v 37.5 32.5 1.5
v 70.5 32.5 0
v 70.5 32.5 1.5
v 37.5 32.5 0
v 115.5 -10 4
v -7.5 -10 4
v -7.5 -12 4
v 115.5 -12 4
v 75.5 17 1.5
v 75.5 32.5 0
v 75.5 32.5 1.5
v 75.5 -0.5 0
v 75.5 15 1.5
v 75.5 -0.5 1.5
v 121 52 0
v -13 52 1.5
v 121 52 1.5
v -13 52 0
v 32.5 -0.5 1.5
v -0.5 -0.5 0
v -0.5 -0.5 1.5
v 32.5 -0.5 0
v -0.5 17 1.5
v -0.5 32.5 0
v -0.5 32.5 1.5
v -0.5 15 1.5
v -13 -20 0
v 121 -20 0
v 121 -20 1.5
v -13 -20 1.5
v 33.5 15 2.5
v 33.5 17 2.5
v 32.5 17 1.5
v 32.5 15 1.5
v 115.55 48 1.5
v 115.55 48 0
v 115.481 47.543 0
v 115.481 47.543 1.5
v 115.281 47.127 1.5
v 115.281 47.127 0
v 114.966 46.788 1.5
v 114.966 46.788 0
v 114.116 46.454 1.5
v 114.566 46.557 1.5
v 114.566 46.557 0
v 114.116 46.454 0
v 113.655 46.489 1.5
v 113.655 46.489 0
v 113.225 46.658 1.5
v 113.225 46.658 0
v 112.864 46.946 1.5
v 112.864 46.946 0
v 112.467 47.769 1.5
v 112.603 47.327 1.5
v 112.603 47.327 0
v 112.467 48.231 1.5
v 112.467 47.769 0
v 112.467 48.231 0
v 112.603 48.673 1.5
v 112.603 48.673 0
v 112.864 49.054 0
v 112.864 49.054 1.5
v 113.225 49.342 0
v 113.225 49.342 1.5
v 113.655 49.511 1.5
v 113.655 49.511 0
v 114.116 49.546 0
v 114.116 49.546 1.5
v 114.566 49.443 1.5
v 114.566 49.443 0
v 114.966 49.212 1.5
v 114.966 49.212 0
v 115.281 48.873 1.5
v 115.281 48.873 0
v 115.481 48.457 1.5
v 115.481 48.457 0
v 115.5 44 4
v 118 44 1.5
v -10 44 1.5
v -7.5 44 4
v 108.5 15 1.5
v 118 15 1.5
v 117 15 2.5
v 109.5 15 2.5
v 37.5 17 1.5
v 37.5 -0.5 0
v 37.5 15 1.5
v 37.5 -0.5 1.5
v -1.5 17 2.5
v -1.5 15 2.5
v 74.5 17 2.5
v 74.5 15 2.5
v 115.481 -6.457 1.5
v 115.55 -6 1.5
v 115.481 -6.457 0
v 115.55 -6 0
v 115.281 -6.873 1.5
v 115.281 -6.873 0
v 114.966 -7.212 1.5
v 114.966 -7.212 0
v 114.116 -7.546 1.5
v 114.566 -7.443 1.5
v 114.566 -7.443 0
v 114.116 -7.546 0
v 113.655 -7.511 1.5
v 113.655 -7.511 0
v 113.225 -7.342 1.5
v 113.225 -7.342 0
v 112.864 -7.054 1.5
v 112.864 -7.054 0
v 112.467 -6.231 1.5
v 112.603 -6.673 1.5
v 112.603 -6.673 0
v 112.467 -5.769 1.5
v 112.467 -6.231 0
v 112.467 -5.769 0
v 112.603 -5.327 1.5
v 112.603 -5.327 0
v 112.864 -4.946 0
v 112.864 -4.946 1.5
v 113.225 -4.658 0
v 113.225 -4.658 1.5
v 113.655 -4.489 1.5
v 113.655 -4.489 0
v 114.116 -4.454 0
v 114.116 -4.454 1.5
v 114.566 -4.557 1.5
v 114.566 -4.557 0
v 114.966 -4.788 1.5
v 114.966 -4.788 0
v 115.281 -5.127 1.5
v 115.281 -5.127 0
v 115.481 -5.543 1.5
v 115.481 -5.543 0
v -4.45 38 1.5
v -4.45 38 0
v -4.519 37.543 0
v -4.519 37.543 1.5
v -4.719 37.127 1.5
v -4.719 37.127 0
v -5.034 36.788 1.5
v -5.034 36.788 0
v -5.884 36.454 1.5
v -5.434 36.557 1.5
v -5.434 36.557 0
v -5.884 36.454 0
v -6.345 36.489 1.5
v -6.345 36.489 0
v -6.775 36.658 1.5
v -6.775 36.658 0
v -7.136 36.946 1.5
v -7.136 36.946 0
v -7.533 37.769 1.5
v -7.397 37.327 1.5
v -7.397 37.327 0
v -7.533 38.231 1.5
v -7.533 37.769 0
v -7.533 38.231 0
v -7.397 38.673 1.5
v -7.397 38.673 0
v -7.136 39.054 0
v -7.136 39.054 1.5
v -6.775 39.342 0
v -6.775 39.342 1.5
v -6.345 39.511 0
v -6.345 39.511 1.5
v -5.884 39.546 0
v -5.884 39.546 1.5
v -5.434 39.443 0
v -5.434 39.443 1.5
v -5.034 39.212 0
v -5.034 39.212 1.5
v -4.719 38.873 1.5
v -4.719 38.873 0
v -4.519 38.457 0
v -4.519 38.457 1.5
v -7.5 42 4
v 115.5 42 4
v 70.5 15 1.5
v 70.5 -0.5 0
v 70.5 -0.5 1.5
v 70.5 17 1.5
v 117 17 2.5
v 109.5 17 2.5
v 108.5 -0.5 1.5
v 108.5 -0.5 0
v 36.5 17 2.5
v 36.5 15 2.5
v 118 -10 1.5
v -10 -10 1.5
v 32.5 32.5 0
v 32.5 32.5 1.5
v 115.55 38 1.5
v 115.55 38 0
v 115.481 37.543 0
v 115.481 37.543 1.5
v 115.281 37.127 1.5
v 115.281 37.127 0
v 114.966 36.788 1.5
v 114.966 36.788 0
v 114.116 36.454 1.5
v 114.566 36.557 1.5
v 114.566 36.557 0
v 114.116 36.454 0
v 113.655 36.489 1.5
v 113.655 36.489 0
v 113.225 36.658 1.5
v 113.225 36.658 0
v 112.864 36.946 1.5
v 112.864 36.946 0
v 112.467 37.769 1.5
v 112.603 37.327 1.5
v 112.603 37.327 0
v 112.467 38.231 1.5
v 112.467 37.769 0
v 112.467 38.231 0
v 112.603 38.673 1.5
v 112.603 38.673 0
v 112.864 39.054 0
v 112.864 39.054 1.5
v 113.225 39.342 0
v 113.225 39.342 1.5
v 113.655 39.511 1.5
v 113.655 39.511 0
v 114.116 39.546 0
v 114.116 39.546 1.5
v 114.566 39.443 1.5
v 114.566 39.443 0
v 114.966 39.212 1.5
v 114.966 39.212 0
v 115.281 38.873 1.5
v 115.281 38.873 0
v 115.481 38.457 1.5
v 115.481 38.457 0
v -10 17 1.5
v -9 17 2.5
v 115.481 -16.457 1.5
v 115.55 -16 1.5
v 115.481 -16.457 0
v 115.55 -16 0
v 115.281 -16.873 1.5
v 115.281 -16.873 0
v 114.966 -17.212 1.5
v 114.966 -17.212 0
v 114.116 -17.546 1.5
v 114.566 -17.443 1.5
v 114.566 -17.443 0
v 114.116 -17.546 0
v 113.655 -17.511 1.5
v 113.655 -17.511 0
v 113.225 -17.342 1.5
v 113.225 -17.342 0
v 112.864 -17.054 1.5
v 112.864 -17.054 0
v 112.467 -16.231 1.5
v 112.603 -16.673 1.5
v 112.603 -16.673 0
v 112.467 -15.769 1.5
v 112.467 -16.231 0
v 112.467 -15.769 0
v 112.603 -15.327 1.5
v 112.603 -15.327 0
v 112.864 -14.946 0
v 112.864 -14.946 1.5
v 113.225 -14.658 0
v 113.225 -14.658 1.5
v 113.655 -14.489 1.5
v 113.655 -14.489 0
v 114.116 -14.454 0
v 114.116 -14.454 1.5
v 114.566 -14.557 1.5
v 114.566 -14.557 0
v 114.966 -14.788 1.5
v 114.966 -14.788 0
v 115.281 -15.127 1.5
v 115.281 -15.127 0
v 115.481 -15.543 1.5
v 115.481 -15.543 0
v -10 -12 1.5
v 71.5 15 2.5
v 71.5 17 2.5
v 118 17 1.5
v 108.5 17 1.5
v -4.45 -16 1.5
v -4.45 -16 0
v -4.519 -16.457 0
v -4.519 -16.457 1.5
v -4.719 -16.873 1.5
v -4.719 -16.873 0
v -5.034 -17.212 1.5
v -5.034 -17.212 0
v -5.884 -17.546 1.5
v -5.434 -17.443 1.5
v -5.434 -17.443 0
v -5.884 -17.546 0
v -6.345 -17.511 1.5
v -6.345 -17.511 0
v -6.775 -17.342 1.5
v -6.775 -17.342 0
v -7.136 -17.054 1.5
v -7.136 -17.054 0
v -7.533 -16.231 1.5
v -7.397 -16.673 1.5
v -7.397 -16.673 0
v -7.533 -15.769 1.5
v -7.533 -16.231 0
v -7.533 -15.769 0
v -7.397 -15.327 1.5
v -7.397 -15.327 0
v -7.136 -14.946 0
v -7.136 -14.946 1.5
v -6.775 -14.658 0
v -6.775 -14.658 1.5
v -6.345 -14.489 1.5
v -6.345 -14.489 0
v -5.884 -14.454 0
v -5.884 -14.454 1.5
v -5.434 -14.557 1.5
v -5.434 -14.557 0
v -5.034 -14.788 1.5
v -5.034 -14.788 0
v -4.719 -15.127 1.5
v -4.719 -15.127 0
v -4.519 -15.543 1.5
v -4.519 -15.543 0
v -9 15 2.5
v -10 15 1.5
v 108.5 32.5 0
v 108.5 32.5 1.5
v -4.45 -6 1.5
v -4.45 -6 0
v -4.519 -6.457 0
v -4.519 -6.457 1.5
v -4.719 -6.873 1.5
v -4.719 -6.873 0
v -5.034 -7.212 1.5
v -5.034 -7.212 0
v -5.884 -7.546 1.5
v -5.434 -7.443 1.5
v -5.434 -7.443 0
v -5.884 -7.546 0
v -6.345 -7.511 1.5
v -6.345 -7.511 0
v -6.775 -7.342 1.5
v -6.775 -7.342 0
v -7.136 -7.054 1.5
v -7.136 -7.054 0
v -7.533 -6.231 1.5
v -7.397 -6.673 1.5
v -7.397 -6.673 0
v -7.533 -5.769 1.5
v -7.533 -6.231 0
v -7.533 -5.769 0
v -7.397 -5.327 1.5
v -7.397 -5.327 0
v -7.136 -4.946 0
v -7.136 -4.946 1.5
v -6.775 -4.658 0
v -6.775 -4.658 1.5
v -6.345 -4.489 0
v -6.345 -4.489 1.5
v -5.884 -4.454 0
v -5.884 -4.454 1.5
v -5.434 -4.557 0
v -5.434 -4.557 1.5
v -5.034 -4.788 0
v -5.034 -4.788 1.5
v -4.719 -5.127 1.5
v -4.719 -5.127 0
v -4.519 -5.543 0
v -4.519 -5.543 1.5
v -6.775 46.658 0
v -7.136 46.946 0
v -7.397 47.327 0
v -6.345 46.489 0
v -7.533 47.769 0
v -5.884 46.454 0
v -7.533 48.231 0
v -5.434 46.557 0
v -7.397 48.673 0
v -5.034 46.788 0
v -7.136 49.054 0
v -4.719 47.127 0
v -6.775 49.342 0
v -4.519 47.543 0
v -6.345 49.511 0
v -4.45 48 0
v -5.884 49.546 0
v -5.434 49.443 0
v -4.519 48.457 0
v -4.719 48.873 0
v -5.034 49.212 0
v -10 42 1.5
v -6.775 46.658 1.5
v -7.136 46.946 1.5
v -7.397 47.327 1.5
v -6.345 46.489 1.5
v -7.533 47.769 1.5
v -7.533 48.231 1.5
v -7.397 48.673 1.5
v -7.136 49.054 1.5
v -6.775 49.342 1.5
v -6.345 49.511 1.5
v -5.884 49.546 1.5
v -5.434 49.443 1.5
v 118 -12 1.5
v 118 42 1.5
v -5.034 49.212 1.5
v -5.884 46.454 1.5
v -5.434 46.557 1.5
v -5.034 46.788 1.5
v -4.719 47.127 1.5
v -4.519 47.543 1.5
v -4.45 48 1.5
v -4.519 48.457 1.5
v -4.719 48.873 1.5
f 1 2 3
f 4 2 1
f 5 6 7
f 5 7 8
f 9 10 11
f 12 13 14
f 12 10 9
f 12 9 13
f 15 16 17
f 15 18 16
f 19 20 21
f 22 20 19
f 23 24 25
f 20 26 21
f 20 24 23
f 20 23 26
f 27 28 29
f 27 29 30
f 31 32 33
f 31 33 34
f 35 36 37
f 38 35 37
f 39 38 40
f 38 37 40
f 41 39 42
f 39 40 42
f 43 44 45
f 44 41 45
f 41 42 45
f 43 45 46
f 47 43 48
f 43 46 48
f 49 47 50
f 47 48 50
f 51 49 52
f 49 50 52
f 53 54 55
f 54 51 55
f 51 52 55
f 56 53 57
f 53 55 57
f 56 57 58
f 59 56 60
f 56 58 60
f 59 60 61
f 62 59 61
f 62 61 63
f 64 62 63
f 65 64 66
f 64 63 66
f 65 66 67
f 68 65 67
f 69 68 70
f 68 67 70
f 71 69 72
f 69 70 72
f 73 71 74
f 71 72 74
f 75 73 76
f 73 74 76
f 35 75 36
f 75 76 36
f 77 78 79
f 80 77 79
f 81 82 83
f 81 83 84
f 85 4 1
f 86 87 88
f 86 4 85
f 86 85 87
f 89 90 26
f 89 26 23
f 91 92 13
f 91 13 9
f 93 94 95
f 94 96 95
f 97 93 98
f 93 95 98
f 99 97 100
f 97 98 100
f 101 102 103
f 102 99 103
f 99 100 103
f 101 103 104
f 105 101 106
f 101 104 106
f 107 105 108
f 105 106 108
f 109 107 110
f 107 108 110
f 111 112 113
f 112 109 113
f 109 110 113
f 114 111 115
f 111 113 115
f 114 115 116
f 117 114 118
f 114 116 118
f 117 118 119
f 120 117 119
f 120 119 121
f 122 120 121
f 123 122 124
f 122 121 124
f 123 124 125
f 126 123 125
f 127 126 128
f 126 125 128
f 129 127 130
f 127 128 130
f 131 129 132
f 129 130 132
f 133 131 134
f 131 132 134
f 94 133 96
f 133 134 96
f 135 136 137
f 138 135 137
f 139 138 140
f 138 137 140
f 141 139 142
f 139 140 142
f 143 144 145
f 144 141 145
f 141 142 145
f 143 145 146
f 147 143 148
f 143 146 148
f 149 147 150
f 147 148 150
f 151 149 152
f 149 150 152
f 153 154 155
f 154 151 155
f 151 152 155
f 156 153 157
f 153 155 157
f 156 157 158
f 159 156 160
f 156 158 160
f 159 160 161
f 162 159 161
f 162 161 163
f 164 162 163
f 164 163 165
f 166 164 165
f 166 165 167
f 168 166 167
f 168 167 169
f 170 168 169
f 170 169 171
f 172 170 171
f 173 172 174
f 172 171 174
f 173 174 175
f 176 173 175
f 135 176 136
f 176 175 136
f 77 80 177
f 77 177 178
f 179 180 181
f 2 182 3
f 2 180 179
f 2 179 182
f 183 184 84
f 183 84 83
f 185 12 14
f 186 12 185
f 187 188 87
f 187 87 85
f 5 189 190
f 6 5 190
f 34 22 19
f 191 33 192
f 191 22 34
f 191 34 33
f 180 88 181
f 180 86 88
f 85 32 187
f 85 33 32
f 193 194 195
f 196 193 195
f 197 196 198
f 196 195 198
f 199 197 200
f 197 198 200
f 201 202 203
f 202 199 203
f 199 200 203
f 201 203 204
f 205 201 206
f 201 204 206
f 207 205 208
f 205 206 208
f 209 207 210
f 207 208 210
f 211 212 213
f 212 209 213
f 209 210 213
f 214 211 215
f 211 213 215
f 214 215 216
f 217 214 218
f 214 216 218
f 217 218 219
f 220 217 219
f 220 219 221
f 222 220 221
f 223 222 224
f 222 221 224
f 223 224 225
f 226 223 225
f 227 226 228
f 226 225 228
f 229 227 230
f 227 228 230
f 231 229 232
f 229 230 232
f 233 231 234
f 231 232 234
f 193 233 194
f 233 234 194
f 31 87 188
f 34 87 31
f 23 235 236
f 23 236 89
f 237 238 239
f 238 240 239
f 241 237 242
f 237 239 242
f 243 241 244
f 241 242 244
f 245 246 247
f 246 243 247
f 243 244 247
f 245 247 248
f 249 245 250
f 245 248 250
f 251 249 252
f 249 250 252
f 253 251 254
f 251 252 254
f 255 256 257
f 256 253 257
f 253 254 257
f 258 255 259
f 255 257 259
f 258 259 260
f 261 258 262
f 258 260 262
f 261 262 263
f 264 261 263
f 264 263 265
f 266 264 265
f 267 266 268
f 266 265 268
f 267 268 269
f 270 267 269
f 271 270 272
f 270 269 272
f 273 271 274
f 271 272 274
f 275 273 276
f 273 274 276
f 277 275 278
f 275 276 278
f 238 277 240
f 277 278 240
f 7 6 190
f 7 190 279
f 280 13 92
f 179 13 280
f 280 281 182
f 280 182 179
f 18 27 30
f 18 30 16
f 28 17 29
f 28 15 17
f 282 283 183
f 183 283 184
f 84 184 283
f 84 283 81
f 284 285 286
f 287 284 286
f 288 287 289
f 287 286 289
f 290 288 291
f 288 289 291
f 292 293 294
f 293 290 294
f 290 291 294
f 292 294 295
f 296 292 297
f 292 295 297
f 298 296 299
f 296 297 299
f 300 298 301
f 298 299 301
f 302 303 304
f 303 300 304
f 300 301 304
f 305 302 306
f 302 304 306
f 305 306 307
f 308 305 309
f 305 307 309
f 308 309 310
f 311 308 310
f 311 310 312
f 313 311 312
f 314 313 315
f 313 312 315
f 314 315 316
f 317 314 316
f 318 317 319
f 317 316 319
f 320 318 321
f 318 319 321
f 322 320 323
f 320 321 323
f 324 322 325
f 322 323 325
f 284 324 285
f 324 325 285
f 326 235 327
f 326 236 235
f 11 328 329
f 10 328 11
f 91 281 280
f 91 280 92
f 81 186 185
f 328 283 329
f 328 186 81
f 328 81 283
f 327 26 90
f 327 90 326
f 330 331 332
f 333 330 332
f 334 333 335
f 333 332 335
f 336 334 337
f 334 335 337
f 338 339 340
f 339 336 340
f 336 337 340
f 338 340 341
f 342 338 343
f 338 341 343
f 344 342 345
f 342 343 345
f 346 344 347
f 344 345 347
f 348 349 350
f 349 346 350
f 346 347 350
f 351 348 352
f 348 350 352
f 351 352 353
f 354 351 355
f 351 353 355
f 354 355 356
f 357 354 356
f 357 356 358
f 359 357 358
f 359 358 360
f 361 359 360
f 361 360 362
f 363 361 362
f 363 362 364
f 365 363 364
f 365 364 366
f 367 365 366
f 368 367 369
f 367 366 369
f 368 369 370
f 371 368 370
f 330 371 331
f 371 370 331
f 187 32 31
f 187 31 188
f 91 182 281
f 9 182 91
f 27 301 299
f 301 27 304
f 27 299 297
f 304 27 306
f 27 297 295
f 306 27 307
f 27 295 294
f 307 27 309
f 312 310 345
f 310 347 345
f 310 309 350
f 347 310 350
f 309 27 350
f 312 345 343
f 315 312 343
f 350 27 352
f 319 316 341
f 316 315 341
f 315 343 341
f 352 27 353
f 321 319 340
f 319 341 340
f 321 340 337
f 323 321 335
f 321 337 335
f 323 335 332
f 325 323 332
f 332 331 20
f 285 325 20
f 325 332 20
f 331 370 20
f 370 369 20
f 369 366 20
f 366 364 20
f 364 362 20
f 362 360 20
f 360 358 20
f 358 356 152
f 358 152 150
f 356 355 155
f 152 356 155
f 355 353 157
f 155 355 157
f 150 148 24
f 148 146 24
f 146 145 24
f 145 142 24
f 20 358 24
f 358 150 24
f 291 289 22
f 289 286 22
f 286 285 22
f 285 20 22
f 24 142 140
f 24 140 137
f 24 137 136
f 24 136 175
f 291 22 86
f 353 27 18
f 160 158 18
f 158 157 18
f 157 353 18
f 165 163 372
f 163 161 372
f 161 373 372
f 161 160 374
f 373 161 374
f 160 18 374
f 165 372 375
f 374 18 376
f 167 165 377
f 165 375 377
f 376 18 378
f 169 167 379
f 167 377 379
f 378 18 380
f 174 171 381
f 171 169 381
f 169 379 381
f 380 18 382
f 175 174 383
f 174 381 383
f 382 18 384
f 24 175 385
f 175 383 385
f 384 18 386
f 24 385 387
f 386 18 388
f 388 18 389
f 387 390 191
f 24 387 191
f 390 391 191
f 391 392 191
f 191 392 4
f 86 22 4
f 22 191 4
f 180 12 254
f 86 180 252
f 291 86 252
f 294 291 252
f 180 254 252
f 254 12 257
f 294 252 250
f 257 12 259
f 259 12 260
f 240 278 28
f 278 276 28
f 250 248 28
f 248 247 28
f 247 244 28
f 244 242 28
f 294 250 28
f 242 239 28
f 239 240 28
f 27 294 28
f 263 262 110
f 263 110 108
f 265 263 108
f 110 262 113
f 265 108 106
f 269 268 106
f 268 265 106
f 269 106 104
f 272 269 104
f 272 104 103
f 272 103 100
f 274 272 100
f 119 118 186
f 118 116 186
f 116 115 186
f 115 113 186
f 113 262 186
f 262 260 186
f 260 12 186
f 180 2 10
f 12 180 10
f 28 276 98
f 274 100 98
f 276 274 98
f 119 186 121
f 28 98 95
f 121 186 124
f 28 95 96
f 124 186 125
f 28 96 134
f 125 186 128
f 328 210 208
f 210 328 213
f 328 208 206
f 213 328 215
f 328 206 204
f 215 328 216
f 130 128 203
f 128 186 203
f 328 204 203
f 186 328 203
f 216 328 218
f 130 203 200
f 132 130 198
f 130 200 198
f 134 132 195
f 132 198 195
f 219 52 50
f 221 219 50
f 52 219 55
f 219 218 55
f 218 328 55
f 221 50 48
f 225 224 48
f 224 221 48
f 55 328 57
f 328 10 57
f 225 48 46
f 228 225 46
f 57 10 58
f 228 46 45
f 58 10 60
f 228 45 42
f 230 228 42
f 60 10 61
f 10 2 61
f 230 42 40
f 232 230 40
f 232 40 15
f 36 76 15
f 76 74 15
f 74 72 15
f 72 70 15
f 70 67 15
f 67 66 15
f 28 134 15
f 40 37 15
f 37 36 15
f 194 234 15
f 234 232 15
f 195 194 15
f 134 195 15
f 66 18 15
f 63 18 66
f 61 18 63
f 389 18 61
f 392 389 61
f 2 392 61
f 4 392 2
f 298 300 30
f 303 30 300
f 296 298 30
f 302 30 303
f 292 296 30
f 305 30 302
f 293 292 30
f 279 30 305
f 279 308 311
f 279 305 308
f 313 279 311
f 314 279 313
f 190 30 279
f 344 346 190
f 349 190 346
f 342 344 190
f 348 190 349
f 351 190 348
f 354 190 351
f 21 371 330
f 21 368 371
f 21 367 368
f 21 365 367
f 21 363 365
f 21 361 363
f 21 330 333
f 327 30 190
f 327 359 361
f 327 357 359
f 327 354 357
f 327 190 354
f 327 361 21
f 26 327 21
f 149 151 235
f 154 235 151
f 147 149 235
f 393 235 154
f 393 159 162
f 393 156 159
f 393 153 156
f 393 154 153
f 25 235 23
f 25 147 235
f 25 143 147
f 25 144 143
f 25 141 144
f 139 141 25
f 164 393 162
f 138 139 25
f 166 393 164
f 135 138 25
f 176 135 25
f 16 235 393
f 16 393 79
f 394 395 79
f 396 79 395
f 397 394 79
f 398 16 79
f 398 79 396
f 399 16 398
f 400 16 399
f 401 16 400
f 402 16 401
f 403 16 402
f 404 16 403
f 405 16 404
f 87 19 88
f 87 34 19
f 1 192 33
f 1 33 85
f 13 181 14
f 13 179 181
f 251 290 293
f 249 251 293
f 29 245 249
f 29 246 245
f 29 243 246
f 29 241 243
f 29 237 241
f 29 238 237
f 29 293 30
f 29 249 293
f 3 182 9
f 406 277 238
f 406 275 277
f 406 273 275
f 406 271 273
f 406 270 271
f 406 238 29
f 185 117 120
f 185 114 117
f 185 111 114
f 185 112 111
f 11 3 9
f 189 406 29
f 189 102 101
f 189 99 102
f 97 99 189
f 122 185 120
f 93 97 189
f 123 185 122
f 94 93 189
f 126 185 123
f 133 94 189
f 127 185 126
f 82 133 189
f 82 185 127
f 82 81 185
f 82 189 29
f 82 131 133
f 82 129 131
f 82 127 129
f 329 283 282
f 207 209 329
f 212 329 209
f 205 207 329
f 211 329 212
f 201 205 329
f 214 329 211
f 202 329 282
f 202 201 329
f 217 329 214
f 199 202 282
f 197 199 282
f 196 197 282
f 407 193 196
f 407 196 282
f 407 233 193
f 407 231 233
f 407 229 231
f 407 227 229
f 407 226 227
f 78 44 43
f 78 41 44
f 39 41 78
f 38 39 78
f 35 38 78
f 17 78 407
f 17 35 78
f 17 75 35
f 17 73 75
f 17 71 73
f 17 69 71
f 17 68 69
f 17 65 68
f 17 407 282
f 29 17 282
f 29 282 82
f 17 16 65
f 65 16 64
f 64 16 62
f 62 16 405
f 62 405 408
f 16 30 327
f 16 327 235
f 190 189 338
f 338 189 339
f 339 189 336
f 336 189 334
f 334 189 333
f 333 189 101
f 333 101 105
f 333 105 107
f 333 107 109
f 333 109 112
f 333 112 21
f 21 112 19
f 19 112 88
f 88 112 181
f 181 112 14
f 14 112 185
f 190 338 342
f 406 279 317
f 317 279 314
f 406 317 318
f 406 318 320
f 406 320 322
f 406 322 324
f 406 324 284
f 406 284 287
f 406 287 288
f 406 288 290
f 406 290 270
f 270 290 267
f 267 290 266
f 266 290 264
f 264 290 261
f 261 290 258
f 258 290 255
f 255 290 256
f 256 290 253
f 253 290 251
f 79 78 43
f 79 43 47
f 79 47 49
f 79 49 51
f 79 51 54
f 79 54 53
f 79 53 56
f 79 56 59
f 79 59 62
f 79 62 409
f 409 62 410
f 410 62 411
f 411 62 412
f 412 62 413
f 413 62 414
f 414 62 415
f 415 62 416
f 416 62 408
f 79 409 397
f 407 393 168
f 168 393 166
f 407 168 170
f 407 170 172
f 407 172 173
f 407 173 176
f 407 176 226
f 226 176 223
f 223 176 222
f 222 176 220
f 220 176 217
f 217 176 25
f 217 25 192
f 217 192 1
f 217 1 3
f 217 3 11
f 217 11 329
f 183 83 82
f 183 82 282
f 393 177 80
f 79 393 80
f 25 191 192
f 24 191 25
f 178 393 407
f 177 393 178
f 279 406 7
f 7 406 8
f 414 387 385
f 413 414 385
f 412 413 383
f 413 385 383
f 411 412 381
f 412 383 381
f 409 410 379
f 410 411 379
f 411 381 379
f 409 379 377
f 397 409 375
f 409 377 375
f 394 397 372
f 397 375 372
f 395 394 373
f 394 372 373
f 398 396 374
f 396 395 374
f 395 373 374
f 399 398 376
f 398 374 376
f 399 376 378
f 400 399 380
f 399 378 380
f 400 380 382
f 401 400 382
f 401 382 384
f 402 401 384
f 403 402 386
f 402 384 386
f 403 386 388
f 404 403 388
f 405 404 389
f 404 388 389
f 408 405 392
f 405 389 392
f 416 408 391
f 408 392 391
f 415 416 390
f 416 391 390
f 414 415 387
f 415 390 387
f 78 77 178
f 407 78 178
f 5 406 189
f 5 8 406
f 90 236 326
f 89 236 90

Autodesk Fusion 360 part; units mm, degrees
sketch "Sketch3" plane through (0, 0, 0) normal (0, 0, 1) x (1, 0, 0)
  line L0 (0, 0) -> (32, 0)
  line L1 (32, 0) -> (32, 32)
  line L2 (32, 32) -> (0, 32)
  line L3 (0, 32) -> (0, 0)
  line L4 (-0.5, 32.5) -> (-0.5, -0.5)
  line L5 (-0.5, -0.5) -> (32.5, -0.5)
  line L6 (32.5, -0.5) -> (32.5, 32.5)
  line L7 (32.5, 32.5) -> (-0.5, 32.5)
  line L8 (70, 32) -> (38, 32)
  line L9 (38, 32) -> (38, 0)
  line L10 (37.5, -0.5) -> (70.5, -0.5)
  line L11 (70.5, 32.5) -> (37.5, 32.5)
  line L12 (70, 0) -> (70, 32)
  line L13 (70.5, -0.5) -> (70.5, 32.5)
  line L14 (38, 0) -> (70, 0)
  line L15 (37.5, 32.5) -> (37.5, -0.5)
  line L16 (108, 32) -> (76, 32)
  line L17 (76, 32) -> (76, 0)
  line L18 (75.5, -0.5) -> (108.5, -0.5)
  line L19 (108.5, 32.5) -> (75.5, 32.5)
  line L20 (108, 0) -> (108, 32)
  line L21 (108.5, -0.5) -> (108.5, 32.5)
  line L22 (76, 0) -> (108, 0)
  line L23 (75.5, 32.5) -> (75.5, -0.5)
  line L24 (38, 32) -> (70, 0)
  line L25 (70, 32) -> (38, 0)
  line L26 (118, -10) -> (-10, -10)
  line L27 (-10, -10) -> (-10, 42)
  line L28 (-10, 42) -> (118, 42)
  line L29 (118, 42) -> (118, -10)
  line L30 (118, -10) -> (-10, 42) construction
  line L31 (-10, -10) -> (118, 42) construction
  circle A0 centre (3, 26) radius 2.05
  circle A1 centre (3, 26) radius 3.55
  circle A2 centre (29, 26) radius 3.55
  circle A3 centre (29, 26) radius 2.05
  circle A4 centre (29, 6) radius 2.05
  circle A5 centre (29, 6) radius 3.55
  circle A6 centre (3, 6) radius 2.05
  circle A7 centre (3, 6) radius 3.55
  circle A8 centre (67, 6) radius 2.05
  circle A9 centre (67, 6) radius 3.55
  circle A10 centre (41, 6) radius 2.05
  circle A11 centre (41, 6) radius 3.55
  circle A12 centre (67, 26) radius 2.05
  circle A13 centre (67, 26) radius 3.55
  circle A14 centre (41, 26) radius 2.05
  circle A15 centre (41, 26) radius 3.55
  circle A16 centre (105, 6) radius 2.05
  circle A17 centre (105, 6) radius 3.55
  circle A18 centre (79, 6) radius 2.05
  circle A19 centre (79, 6) radius 3.55
  circle A20 centre (105, 26) radius 2.05
  circle A21 centre (105, 26) radius 3.55
  circle A22 centre (79, 26) radius 2.05
  circle A23 centre (79, 26) radius 3.55
  line L32 (3, 22.45) -> (-0.5, 22.45)
  line L33 (-0.5, 22.45) -> (-0.5, 9.55)
  line L34 (-0.5, 9.55) -> (3, 9.55)
  line L35 (3, 9.55) -> (3, 22.45)
  line L36 (41, 22.45) -> (37.5, 22.45)
  line L37 (41, 9.55) -> (41, 22.45)
  line L38 (37.5, 9.55) -> (41, 9.55)
  line L39 (37.5, 22.45) -> (37.5, 9.55)
  line L40 (79, 22.45) -> (75.5, 22.45)
  line L41 (79, 9.55) -> (79, 22.45)
  line L42 (75.5, 9.55) -> (79, 9.55)
  line L43 (75.5, 22.45) -> (75.5, 9.55)
  circle A24 centre (-6, 38) radius 1.55
  circle A25 centre (-6, 38) radius 3.05
  circle A26 centre (54, 38) radius 1.55
  circle A27 centre (54, 38) radius 3.05
  circle A28 centre (114, 38) radius 1.55
  circle A29 centre (114, 38) radius 3.05
  circle A30 centre (-6, -6) radius 1.55
  circle A31 centre (-6, -6) radius 3.05
  circle A32 centre (54, -6) radius 1.55
  circle A33 centre (54, -6) radius 3.05
  circle A34 centre (114, -6) radius 1.55
  circle A35 centre (114, -6) radius 3.05
  line L44 (121, -20) -> (-13, -20)
  line L45 (-13, -20) -> (-13, 52)
  line L46 (-13, 52) -> (121, 52)
  line L47 (121, 52) -> (121, -20)
  line L48 (121, -20) -> (-13, 52) construction
  line L49 (-13, -20) -> (121, 52) construction
  circle A36 centre (-6, 48) radius 1.55
  circle A37 centre (114, 48) radius 1.55
  circle A38 centre (114, -16) radius 1.55
  circle A39 centre (-6, -16) radius 1.55
  line L50 (118, 15) -> (-10, 15)
  line L51 (-10, 15) -> (-10, 17)
  line L52 (-10, 17) -> (118, 17)
  line L53 (118, 17) -> (118, 15)
  line L54 (118, 15) -> (-10, 17) construction
  line L55 (-10, 15) -> (118, 17) construction
  line L56 (-10, -10) -> (118, -10)
  line L57 (118, -10) -> (118, -12)
  line L58 (118, -12) -> (-10, -12)
  line L59 (-10, -12) -> (-10, -10)
  line L60 (-10, 42) -> (118, 42)
  line L61 (118, 42) -> (118, 44)
  line L62 (118, 44) -> (-10, 44)
  line L63 (-10, 44) -> (-10, 42)
  point P0 (38, 0)
  point P1 (76, 0)
  point P2 (54, 16)
  point P3 (54, 16)
  point P4 (54, 16)
  dimension "d57" = 32
  dimension "d58" = 32
  dimension "d59" = 0.5
  dimension "d62" = 76
  dimension "d63" = 0
  dimension "d66" = 10
  dimension "d67" = 10
  dimension "d68" = 4.1
  dimension "d69" = 3
  dimension "d70" = 6
  dimension "d71" = 7.1
  dimension "d74" = 26
  dimension "d75" = 0
  dimension "d78" = 0
  dimension "d79" = -20
  dimension "d82" = 76
  dimension "d83" = 0
  dimension "d84" = 3.5
  dimension "d85" = 12.9
  dimension "d86" = 9.55
  dimension "d89" = 76
  dimension "d90" = 0
  dimension "d95" = 4
  dimension "d96" = 4
  dimension "d97" = 3.1
  dimension "d98" = 6.1
  dimension "d101" = 120
  dimension "d102" = 0
  dimension "d105" = 0
  dimension "d106" = -44
  dimension "d114" = 134
  dimension "d115" = 72
  dimension "d116" = 3.1
  dimension "d117" = 7
  dimension "d118" = 4
  dimension "d121" = 120
  dimension "d122" = 0
  dimension "d125" = 0
  dimension "d126" = -64
  dimension "d127" = 128
  dimension "d128" = 2
  dimension "d134" = 2
  dimension "d135" = 2
extrude "Extrude4" add sketch "Sketch3" along normal blind 1.5 contours L4 A7 | L4 L5 L6 L10 L13 L15 L18 L21 L23 L26 L27 L29 A5 A7 A9 A11 A17 A19 L33 L39 L43 L50 L56 | L6 A5 | L6 L15 L39 L50 L52 | L4 L27 L33 L50 L51 L52 | L4 L6 L7 L11 L13 L15 L19 L21 L23 L27 L28 L29 A1 A2 A13 A15 A21 A23 L33 L39 L43 L52 L60 | L6 A2 | L26 L56 L57 L58 L59 | L15 A11 | L4 A1 | L28 L60 L61 L62 L63 | L15 A15 | L21 L29 L50 L52 L53 | L21 A17 | L13 A9 | L13 L23 L43 L50 L52 | L21 A21 | L13 A13 | L23 A19 | L23 A23 | A25 | A26 | A27 | A29 | A31 | A32 | A33 | A35 | L44 L45 L46 L47
extrude "Extrude6" add sketch "Sketch3" along normal blind 4 contours L26 L56 L57 L58 L59 | L28 L60 L61 L62 L63
chamfer "Chamfer2" distance 2.5 angle 45 4 edges at (118, 43, 4) (118, -11, 4) (-10, -11, 4) (-10, 43, 4)
extrude "Extrude5" add sketch "Sketch3" along normal blind 2.5 contours L6 L15 L39 L50 L52 | L4 L27 L33 L50 L51 L52 | L21 L29 L50 L52 L53 | L13 L23 L43 L50 L52
chamfer "Chamfer1" distance 1 angle 45 8 edges at (118, 16, 2.5) (108.5, 16, 2.5) (75.5, 16, 2.5) (70.5, 16, 2.5) (37.5, 16, 2.5) (32.5, 16, 2.5) (-0.5, 16, 2.5) (-10, 16, 2.5)
equation "d71 = d68 + 3 mm"
equation "d98 = d97 + 3 mm"
equation "d115 = 52 mm + 20 mm"
equation "d116 = d97"
